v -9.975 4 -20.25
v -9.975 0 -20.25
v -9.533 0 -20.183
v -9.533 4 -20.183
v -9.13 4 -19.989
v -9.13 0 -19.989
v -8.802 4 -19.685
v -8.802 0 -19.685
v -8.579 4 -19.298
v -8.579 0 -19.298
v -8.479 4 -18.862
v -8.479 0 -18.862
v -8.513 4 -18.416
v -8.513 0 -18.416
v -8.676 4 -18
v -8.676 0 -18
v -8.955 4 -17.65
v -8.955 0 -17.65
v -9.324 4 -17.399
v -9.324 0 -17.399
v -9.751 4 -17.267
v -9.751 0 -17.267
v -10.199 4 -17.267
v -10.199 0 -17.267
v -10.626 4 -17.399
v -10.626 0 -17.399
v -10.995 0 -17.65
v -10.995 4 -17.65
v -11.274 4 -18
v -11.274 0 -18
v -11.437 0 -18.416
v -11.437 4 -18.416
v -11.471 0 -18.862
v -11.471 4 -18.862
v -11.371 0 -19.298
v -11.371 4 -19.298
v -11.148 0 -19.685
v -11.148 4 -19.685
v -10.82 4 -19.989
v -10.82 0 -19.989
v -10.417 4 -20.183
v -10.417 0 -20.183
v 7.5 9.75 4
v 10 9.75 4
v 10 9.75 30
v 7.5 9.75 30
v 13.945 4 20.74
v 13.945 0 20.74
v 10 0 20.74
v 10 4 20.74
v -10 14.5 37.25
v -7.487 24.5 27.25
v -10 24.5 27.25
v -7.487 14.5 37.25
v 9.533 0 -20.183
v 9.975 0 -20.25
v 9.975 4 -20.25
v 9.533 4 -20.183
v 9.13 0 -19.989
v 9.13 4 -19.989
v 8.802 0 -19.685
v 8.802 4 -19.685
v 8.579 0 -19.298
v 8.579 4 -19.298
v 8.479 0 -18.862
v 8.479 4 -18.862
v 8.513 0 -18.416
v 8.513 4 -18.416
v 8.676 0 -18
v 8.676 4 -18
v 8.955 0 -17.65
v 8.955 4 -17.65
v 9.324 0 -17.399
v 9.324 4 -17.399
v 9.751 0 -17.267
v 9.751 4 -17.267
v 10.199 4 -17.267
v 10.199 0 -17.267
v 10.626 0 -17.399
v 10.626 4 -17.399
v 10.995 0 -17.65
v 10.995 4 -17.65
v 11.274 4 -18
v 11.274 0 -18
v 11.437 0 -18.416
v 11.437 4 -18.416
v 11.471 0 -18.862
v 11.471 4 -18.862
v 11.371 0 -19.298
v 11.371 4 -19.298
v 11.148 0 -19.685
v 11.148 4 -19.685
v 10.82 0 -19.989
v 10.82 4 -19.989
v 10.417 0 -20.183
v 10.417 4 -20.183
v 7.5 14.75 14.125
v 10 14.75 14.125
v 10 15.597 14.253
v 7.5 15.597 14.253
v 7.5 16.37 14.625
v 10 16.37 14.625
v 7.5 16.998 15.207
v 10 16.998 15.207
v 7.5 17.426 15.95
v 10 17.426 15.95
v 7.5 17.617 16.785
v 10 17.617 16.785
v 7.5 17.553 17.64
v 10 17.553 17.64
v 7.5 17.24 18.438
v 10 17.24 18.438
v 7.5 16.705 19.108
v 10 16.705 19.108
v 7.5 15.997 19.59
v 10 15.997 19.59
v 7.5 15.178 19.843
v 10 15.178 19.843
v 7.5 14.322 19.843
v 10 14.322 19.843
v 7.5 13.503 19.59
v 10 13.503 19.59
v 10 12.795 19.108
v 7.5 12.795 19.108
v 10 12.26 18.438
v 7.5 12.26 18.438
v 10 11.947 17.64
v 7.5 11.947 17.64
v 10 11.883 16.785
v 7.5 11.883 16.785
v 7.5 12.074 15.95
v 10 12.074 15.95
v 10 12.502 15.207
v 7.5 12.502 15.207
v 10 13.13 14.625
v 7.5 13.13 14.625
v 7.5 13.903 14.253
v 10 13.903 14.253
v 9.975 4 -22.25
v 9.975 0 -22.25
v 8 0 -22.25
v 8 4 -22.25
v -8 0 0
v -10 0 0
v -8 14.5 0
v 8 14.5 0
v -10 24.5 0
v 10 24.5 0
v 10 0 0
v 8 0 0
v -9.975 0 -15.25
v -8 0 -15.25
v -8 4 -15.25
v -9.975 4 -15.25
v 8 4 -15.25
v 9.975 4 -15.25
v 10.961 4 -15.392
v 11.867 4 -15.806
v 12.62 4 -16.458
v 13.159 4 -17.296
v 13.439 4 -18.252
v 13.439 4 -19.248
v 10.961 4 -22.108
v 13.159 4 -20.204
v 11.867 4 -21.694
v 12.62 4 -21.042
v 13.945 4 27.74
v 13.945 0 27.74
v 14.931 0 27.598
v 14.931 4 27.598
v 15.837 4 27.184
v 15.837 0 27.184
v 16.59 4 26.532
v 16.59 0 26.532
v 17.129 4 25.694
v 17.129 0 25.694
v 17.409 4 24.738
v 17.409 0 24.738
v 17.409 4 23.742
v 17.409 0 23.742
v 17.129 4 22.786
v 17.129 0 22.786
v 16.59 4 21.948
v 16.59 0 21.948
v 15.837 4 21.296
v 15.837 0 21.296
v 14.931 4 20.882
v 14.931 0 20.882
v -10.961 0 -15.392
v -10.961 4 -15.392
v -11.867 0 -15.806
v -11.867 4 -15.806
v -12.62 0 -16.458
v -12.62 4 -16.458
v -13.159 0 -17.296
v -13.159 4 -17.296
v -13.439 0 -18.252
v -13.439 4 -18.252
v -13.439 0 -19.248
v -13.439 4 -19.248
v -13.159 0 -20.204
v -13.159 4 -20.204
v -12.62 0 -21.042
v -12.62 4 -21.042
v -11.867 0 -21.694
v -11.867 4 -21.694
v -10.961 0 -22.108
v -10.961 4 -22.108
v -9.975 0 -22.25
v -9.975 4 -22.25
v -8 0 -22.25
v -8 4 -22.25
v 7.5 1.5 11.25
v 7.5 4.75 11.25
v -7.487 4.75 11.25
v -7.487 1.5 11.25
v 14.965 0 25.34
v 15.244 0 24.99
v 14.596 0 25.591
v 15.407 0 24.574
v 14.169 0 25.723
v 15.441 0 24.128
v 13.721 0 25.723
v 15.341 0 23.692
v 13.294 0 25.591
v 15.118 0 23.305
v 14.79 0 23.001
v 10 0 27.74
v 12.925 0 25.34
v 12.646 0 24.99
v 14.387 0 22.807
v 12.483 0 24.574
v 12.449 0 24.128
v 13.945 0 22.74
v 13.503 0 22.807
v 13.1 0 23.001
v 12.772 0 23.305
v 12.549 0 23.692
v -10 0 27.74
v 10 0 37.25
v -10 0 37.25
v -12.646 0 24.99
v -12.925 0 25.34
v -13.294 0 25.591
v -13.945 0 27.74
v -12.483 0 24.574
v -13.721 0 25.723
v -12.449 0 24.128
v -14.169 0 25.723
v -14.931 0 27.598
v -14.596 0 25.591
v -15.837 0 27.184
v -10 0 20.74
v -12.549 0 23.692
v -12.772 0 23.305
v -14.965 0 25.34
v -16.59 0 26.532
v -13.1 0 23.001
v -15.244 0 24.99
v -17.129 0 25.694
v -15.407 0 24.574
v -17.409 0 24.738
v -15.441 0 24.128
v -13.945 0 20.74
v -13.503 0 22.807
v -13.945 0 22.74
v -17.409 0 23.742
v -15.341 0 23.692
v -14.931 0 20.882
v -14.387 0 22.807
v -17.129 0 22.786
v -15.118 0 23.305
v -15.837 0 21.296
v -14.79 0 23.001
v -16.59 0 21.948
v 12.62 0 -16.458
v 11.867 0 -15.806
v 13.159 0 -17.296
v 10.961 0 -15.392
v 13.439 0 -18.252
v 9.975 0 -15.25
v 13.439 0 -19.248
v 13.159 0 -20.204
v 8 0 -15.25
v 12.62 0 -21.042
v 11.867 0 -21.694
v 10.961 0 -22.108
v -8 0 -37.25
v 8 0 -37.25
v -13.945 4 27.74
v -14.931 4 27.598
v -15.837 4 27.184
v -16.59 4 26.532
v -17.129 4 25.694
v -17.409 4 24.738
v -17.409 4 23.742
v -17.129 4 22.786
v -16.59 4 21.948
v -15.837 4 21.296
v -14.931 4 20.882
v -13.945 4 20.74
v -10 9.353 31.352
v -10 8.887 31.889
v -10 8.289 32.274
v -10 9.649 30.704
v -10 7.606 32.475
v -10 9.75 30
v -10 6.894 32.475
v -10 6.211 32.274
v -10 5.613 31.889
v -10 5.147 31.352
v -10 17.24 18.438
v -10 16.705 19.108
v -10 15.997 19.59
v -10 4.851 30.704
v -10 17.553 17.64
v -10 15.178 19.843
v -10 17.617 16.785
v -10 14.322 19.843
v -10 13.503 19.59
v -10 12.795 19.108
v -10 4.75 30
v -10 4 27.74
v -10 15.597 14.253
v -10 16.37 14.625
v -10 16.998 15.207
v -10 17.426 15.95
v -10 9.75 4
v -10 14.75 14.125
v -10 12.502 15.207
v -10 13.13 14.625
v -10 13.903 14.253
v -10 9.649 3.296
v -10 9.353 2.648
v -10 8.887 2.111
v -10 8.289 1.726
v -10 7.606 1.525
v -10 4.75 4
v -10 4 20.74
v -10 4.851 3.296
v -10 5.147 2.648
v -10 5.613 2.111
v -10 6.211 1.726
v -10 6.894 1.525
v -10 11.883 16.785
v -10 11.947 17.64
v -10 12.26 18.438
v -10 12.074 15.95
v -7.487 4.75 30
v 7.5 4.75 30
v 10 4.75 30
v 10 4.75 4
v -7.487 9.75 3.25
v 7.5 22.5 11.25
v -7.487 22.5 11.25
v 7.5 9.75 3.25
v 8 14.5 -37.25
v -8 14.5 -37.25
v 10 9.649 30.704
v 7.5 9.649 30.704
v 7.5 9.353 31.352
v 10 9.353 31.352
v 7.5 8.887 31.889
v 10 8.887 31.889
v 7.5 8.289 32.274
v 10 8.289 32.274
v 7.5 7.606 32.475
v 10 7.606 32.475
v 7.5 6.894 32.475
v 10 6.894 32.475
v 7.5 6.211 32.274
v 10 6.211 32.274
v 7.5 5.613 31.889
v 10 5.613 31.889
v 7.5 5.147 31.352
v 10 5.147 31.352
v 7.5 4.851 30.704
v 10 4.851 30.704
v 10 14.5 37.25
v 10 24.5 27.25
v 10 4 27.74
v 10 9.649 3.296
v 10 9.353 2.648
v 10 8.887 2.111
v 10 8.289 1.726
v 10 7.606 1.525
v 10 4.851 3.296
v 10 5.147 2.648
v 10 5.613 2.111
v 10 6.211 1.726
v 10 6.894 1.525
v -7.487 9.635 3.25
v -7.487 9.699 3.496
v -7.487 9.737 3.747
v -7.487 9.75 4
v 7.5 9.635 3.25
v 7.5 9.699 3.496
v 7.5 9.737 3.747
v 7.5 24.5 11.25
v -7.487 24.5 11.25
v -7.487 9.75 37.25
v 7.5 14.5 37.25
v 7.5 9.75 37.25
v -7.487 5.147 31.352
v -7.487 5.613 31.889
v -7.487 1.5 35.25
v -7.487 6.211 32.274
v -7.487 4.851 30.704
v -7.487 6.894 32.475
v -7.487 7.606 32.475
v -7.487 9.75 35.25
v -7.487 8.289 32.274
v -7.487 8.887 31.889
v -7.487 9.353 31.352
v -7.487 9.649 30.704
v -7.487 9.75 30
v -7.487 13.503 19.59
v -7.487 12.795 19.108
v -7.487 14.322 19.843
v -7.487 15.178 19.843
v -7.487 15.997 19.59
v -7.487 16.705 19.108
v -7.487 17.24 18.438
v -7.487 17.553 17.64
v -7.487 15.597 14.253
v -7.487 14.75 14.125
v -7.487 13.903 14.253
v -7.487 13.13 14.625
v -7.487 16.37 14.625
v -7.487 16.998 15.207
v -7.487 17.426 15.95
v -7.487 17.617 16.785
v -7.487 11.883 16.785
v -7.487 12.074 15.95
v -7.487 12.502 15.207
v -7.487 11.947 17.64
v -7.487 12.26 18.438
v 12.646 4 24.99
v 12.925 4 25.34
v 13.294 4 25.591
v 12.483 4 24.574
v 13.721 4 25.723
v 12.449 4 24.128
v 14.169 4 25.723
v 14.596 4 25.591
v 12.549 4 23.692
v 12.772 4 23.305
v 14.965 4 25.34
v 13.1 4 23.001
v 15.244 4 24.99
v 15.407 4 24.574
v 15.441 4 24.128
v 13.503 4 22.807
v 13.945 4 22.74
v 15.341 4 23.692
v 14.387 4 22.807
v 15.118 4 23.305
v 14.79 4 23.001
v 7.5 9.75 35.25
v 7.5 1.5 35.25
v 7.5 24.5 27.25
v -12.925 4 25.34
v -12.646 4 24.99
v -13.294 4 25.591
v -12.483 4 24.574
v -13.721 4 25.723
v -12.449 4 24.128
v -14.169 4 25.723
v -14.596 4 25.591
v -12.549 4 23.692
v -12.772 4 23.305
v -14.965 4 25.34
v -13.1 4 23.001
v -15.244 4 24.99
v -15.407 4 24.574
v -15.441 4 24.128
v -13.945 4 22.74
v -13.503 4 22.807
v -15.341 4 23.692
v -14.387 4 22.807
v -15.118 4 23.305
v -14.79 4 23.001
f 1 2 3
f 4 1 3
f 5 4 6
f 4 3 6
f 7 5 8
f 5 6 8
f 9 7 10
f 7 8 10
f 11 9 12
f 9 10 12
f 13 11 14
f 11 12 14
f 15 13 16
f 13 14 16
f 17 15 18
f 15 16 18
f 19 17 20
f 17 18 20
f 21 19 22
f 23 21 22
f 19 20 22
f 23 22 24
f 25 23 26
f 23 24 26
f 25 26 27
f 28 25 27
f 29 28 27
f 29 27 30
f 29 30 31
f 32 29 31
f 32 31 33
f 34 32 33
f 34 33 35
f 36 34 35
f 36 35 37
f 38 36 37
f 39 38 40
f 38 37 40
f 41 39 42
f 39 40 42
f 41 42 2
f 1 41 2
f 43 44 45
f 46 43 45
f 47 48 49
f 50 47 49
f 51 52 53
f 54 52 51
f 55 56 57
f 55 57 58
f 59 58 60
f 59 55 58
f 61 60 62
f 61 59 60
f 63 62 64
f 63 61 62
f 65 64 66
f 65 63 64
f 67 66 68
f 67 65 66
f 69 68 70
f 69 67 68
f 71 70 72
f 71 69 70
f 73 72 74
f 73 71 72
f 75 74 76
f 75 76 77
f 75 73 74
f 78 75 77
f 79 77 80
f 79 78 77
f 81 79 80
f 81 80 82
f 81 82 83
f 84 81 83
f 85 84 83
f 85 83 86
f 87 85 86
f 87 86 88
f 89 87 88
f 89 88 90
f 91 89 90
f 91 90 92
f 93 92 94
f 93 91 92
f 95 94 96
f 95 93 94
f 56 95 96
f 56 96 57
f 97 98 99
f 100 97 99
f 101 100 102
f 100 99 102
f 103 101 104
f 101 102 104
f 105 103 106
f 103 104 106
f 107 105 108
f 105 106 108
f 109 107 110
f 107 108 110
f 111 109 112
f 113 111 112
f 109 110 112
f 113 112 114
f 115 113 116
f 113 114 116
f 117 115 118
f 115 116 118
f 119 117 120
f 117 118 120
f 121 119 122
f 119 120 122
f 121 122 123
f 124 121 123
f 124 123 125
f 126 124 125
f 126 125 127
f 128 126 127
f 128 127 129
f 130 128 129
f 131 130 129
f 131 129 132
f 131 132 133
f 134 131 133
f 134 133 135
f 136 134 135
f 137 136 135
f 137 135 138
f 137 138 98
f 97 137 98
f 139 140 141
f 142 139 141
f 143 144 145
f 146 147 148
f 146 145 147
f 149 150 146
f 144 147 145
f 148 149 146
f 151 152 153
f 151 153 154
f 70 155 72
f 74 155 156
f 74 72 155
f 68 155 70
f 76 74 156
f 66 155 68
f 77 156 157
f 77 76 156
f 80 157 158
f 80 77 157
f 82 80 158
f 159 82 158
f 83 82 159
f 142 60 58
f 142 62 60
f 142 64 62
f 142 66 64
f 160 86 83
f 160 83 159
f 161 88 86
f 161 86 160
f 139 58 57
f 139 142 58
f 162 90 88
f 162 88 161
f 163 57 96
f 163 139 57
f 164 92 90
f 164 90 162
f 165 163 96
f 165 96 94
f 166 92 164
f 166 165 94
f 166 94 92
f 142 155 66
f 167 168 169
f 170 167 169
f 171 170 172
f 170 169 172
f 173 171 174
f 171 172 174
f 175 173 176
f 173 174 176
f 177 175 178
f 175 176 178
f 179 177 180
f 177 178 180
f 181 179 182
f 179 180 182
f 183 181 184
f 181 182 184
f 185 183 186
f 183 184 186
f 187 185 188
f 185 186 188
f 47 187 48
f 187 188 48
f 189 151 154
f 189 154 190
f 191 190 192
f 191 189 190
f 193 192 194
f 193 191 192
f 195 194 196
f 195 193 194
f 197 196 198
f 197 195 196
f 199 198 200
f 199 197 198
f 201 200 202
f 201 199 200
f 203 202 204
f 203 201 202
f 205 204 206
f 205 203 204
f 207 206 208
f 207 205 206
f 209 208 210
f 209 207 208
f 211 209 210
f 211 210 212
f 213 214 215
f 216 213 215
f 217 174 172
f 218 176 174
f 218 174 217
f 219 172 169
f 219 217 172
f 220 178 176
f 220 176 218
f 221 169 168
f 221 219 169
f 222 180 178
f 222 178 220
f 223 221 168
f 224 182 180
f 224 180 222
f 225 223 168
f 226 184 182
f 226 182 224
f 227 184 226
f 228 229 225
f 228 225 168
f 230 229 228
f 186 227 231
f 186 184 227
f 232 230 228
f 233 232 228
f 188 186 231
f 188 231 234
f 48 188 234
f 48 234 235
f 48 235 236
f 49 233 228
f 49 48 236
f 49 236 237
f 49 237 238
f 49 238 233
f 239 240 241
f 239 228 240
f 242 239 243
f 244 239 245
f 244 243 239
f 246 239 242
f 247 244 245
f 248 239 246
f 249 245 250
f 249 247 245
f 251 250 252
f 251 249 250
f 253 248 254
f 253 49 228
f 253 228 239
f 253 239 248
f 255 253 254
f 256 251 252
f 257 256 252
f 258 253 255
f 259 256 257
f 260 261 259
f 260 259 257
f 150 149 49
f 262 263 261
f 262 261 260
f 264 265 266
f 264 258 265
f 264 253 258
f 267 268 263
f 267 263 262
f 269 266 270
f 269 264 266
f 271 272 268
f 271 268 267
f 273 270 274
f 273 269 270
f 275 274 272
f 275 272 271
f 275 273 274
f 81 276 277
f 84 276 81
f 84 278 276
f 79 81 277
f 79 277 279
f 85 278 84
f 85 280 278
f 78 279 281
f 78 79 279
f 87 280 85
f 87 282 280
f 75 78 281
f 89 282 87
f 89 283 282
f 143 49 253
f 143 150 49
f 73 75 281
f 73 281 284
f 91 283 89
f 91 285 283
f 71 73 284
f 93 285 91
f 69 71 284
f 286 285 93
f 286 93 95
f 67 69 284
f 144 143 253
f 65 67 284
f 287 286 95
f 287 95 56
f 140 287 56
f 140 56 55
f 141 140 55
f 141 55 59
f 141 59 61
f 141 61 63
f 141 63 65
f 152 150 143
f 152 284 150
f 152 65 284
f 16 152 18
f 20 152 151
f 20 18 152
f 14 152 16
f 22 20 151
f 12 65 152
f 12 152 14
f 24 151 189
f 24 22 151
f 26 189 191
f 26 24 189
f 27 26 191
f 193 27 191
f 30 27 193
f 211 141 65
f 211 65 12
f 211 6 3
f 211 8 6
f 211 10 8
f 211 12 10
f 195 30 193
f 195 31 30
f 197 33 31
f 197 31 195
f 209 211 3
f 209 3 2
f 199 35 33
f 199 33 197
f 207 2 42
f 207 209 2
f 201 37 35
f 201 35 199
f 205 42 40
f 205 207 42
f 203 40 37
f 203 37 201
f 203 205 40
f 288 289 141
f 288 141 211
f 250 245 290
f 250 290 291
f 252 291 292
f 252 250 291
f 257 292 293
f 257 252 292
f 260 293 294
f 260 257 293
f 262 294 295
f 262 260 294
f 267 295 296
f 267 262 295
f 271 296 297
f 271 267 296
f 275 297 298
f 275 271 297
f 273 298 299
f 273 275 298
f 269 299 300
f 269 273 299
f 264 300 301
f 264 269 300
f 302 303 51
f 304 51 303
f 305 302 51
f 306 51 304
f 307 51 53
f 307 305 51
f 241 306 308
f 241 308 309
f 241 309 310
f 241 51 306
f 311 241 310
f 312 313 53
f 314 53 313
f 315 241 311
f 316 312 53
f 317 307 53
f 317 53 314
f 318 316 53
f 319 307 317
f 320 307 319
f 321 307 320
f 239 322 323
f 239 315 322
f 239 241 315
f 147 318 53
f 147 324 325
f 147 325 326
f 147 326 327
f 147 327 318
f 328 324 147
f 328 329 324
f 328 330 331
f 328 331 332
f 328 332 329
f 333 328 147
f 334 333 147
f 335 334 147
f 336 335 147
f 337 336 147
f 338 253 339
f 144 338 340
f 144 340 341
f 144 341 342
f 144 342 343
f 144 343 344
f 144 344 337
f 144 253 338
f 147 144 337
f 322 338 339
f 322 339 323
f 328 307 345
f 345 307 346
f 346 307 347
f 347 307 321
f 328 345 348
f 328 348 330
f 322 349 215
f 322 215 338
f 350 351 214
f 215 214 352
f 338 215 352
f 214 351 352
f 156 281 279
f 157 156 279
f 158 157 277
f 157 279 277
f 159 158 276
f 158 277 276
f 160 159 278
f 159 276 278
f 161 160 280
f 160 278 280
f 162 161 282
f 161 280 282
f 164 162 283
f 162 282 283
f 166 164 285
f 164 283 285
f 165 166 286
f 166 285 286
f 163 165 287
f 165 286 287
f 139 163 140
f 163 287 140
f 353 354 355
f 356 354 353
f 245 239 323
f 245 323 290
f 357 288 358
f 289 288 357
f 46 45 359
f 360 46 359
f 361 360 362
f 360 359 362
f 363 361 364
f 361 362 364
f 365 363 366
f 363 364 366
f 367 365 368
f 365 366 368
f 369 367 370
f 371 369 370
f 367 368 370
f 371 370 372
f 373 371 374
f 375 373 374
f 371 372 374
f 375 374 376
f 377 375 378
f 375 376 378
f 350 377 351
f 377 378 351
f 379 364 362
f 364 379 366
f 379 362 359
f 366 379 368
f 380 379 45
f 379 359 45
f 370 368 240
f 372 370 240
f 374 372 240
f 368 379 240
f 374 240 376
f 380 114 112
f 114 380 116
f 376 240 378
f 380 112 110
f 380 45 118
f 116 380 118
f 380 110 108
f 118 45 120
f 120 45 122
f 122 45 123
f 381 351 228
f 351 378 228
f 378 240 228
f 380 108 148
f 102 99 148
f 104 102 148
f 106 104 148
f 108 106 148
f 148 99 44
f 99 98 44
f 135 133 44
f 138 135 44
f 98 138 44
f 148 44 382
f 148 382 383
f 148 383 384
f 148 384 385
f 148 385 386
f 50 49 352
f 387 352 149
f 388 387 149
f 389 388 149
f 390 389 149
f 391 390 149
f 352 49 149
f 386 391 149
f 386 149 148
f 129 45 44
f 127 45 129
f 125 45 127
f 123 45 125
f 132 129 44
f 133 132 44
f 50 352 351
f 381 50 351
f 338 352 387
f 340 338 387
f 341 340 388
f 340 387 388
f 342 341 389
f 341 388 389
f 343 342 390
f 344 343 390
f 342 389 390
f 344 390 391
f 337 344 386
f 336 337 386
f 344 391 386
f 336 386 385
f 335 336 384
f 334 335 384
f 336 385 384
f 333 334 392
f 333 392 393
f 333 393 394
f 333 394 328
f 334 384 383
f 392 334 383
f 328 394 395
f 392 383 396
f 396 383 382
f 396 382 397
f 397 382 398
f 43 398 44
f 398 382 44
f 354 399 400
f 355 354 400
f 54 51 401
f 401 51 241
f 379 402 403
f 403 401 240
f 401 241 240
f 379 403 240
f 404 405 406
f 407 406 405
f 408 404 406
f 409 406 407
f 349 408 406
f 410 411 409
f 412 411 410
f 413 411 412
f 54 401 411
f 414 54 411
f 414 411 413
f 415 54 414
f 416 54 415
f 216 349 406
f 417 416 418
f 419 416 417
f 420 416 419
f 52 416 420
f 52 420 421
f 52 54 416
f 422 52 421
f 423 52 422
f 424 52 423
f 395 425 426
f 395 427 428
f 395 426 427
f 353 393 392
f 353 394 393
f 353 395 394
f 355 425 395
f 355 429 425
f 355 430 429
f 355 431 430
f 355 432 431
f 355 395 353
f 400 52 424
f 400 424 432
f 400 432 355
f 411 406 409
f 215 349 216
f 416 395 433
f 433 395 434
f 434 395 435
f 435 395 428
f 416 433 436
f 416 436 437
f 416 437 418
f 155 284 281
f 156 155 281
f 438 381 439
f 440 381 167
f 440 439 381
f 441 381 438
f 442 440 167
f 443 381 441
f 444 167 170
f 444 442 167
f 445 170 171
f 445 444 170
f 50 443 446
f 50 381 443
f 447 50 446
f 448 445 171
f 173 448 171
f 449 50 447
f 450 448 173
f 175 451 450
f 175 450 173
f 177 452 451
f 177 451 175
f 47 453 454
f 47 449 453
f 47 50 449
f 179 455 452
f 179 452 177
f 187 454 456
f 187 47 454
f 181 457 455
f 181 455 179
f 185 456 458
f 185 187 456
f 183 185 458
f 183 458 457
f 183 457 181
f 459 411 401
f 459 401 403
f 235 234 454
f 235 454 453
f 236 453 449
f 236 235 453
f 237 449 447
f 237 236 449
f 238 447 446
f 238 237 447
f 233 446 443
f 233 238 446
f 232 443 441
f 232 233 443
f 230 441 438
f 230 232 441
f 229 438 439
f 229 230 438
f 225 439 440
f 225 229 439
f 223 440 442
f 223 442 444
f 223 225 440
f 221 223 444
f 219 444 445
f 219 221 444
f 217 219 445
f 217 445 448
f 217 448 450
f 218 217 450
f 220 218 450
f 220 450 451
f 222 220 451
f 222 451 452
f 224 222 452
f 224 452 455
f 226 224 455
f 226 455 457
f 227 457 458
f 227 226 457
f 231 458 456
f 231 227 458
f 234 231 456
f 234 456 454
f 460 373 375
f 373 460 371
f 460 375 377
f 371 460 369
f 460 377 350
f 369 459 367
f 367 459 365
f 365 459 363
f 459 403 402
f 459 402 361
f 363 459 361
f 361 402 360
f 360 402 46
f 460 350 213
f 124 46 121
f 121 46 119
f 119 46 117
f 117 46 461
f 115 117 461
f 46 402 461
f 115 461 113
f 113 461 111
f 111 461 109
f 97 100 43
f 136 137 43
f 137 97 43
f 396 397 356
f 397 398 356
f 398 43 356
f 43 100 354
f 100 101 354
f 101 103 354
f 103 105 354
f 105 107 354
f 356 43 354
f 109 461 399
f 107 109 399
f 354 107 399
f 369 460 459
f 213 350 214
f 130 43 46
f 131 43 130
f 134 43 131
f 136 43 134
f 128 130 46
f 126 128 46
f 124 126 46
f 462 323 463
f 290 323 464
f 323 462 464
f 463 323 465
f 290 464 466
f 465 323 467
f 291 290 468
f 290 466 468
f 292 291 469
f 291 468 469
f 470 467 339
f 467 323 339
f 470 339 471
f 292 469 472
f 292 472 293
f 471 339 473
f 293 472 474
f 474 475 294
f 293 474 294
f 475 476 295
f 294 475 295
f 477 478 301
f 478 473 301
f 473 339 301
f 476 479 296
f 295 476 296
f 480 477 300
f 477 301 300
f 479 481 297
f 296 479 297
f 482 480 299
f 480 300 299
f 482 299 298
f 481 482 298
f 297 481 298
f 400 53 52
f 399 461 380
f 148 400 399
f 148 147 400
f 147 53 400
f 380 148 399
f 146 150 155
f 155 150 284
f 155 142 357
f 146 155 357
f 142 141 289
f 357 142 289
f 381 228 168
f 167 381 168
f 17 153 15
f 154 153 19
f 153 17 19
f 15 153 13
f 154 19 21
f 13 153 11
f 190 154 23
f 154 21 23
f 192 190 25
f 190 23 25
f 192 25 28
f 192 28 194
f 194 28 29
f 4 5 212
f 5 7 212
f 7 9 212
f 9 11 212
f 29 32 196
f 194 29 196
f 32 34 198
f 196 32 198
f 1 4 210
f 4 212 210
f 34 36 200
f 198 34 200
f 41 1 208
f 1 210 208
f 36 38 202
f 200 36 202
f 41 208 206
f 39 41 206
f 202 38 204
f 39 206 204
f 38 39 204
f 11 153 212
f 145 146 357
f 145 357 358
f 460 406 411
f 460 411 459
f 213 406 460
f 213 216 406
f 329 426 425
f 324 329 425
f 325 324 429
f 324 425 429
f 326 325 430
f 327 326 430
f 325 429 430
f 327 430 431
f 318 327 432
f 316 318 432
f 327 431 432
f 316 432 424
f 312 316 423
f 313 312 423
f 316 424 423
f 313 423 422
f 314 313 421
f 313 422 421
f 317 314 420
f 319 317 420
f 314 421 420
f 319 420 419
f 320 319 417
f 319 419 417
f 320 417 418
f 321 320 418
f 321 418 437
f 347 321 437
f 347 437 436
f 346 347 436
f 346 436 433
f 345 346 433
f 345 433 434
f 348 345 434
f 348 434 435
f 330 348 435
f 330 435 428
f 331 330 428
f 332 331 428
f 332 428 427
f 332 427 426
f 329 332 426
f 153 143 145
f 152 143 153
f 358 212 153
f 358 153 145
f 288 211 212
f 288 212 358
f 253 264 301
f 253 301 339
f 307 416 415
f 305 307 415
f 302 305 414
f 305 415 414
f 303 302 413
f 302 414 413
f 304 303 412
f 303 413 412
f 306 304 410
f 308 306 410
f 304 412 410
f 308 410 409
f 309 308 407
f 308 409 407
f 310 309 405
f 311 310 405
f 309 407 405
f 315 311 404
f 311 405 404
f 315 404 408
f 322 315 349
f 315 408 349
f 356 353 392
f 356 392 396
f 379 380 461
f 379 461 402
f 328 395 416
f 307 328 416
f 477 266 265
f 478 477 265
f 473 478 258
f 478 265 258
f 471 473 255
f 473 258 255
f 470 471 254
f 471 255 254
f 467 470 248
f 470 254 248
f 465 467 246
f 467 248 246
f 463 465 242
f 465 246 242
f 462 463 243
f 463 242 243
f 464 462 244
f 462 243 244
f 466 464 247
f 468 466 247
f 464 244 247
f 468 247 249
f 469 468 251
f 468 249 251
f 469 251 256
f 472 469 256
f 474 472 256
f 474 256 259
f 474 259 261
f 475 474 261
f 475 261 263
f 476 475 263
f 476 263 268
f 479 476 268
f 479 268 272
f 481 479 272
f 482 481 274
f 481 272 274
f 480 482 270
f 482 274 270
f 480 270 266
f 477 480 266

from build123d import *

# Parameters (mm, degrees)
SKETCH1_W               = 16
SKETCH1_H               = 74.5
BOSS_EXTRUDE1_DEPTH     = 14.5
SKETCH2_R               = 1.5
BOSS_EXTRUDE2_DEPTH     = 4
SKETCH3_W               = 2
SKETCH3_H               = 37.25
BOSS_EXTRUDE3_DEPTH     = 14.5
SKETCH4_R               = 1.5
BOSS_EXTRUDE4_DEPTH     = 4
CUT_EXTRUDE1_DEPTH      = 49.487529582
SKETCH7_W               = 20
SKETCH7_H               = 37.25
BOSS_EXTRUDE5_DEPTH     = 10
SKETCH8_W               = 7.5
SKETCH8_H               = 26
SKETCH8_W_2             = 7.486605722
CUT_EXTRUDE2_DEPTH      = 23
SKETCH10_W              = 14.986605722
SKETCH10_H              = 2
BOSS_EXTRUDE6_DEPTH     = 13
CUT_EXTRUDE3_DEPTH      = 14.986605722
SKETCH13_W              = 14.986605722
SKETCH13_H              = 0.75
CUT_EXTRUDE4_DEPTH      = 1
SKETCH14_R              = 2.875
CUT_EXTRUDE5_DEPTH      = 53.354947474
CUT_EXTRUDE6_DEPTH      = 52.088800387
CUT_EXTRUDE6_DEPTH_BACK = 52.088800387
SKETCH16_W              = 14.986605722
SKETCH16_H              = 2
CUT_EXTRUDE7_DEPTH      = 4.75


with BuildPart() as part:
    # Sketch1 → Boss-Extrude1 (new body)
    with BuildSketch(Plane(origin=(0, 0, 0), x_dir=(1, 0, 0), z_dir=(0, 1, 0))):
        Rectangle(SKETCH1_W, SKETCH1_H)
    extrude(amount=BOSS_EXTRUDE1_DEPTH)

    # Sketch2 → Boss-Extrude2 (add)
    with BuildSketch(Plane(origin=(0, 0, 0), x_dir=(-1, 0, 0), z_dir=(0, -1, 0))):
        with BuildLine():
            Line((8, 22.25), (8, 18.75))
            Line((8, 18.75), (8, 15.25))
            Line((8, 15.25), (9.975, 15.25))
            ThreePointArc((9.975, 15.25), (13.475, 18.75), (9.975, 22.25))
            Line((9.975, 22.25), (8, 22.25))
        make_face()
        with Locations(Location((9.975, 18.75, 0), (0, 0, 90))):
            Circle(SKETCH2_R, mode=Mode.SUBTRACT)
    boss_extrude2 = extrude(amount=-BOSS_EXTRUDE2_DEPTH)

    # Mirror1: Boss-Extrude2 across plane
    add(boss_extrude2.mirror(Plane(origin=(0, 0, 0), x_dir=(0, 0, 1), z_dir=(1, 0, 0))))

    # Sketch3 → Boss-Extrude3 (add)
    with BuildSketch(Plane(origin=(0, 0, 0), x_dir=(-1, 0, 0), z_dir=(0, -1, 0))):
        with Locations((9, -18.625)):
            Rectangle(SKETCH3_W, SKETCH3_H)
        with Locations((-9, -18.625)):
            Rectangle(SKETCH3_W, SKETCH3_H)
    extrude(amount=-BOSS_EXTRUDE3_DEPTH)

    # Sketch4 → Boss-Extrude4 (add)
    with BuildSketch(Plane(origin=(0, 0, 0), x_dir=(-1, 0, 0), z_dir=(0, -1, 0))):
        with BuildLine():
            Line((10, -20.74), (10, -27.74))
            Line((10, -27.74), (13.945, -27.74))
            ThreePointArc((13.945, -27.74), (17.445, -24.24), (13.945, -20.74))
            Line((13.945, -20.74), (10, -20.74))
        make_face()
        with Locations(Location((13.945, -24.24, 0), (0, 0, 90))):
            Circle(SKETCH4_R, mode=Mode.SUBTRACT)
    boss_extrude4 = extrude(amount=-BOSS_EXTRUDE4_DEPTH)

    # Mirror4: Boss-Extrude4 across plane
    add(boss_extrude4.mirror(Plane(origin=(0, 0, 0), x_dir=(0, 0, 1), z_dir=(1, 0, 0))))

    # Sketch5 → Cut-Extrude1 (cut, through all)
    with BuildSketch(Plane(origin=(10, 0, 0), x_dir=(0, 0, -1), z_dir=(1, 0, 0))):
        with BuildLine():
            Line((-4, 9.75), (-30, 9.75))
            ThreePointArc((-30, 9.75), (-32.5, 7.25), (-30, 4.75))
            Line((-30, 4.75), (-4, 4.75))
            ThreePointArc((-4, 4.75), (-1.5, 7.25), (-4, 9.75))
        make_face()
    extrude(amount=-CUT_EXTRUDE1_DEPTH, mode=Mode.SUBTRACT)

    # Sketch7 → Boss-Extrude5 (add)
    with BuildSketch(Plane(origin=(0, 14.5, 0), x_dir=(1, 0, 0), z_dir=(0, 1, 0))):
        with Locations((0, -18.625)):
            Rectangle(SKETCH7_W, SKETCH7_H)
    extrude(amount=BOSS_EXTRUDE5_DEPTH)

    # Sketch8 → Cut-Extrude2 (cut)
    with BuildSketch(Plane(origin=(0, 24.5, 0), x_dir=(1, 0, 0), z_dir=(0, 1, 0))):
        with Locations((3.75, -24.25)):
            Rectangle(SKETCH8_W, SKETCH8_H)
        with Locations((-3.743302861, -24.25)):
            Rectangle(SKETCH8_W_2, SKETCH8_H)
    extrude(amount=-CUT_EXTRUDE2_DEPTH, mode=Mode.SUBTRACT)

    # Sketch10 → Boss-Extrude6 (add)
    with BuildSketch(Plane(origin=(0, 1.5, 0), x_dir=(1, 0, 0), z_dir=(0, 1, 0))):
        with Locations((0.006697139, -36.25)):
            Rectangle(SKETCH10_W, SKETCH10_H)
    extrude(amount=BOSS_EXTRUDE6_DEPTH)

    # Sketch12 → Cut-Extrude3 (cut)
    with BuildSketch(Plane.ZY.offset(-7.5)):
        Polygon((11.25, 9.75), (11.25, 22.5), (3.25, 9.75), align=None)
    extrude(amount=CUT_EXTRUDE3_DEPTH, mode=Mode.SUBTRACT)

    # Sketch13 → Cut-Extrude4 (cut)
    with BuildSketch(Plane(origin=(0, 9.75, 0), x_dir=(1, 0, 0), z_dir=(0, 1, 0))):
        with Locations((0.006697139, -3.625)):
            Rectangle(SKETCH13_W, SKETCH13_H)
    extrude(amount=-CUT_EXTRUDE4_DEPTH, mode=Mode.SUBTRACT)

    # Sketch14 → Cut-Extrude5 (cut, through all)
    with BuildSketch(Plane(origin=(10, 0, 0), x_dir=(0, 0, -1), z_dir=(1, 0, 0))):
        with Locations((-17, 14.75)):
            Circle(SKETCH14_R)
    extrude(amount=-CUT_EXTRUDE5_DEPTH, mode=Mode.SUBTRACT)

    # Sketch15 → Cut-Extrude6 (cut, two sides: drawn at the far end of the back side and taken through both)
    with BuildSketch(Plane.ZY.offset(-7.5).offset(-CUT_EXTRUDE6_DEPTH_BACK)):
        Polygon((37.25, 14.5), (37.25, 24.5), (27.25, 24.5), align=None)
    extrude(amount=CUT_EXTRUDE6_DEPTH + CUT_EXTRUDE6_DEPTH_BACK, mode=Mode.SUBTRACT)

    # Sketch16 → Cut-Extrude7 (cut)
    with BuildSketch(Plane(origin=(0, 14.5, 0), x_dir=(1, 0, 0), z_dir=(0, 1, 0))):
        with Locations((0.006697139, -36.25)):
            Rectangle(SKETCH16_W, SKETCH16_H)
    extrude(amount=-CUT_EXTRUDE7_DEPTH, mode=Mode.SUBTRACT)


solid = part.part
